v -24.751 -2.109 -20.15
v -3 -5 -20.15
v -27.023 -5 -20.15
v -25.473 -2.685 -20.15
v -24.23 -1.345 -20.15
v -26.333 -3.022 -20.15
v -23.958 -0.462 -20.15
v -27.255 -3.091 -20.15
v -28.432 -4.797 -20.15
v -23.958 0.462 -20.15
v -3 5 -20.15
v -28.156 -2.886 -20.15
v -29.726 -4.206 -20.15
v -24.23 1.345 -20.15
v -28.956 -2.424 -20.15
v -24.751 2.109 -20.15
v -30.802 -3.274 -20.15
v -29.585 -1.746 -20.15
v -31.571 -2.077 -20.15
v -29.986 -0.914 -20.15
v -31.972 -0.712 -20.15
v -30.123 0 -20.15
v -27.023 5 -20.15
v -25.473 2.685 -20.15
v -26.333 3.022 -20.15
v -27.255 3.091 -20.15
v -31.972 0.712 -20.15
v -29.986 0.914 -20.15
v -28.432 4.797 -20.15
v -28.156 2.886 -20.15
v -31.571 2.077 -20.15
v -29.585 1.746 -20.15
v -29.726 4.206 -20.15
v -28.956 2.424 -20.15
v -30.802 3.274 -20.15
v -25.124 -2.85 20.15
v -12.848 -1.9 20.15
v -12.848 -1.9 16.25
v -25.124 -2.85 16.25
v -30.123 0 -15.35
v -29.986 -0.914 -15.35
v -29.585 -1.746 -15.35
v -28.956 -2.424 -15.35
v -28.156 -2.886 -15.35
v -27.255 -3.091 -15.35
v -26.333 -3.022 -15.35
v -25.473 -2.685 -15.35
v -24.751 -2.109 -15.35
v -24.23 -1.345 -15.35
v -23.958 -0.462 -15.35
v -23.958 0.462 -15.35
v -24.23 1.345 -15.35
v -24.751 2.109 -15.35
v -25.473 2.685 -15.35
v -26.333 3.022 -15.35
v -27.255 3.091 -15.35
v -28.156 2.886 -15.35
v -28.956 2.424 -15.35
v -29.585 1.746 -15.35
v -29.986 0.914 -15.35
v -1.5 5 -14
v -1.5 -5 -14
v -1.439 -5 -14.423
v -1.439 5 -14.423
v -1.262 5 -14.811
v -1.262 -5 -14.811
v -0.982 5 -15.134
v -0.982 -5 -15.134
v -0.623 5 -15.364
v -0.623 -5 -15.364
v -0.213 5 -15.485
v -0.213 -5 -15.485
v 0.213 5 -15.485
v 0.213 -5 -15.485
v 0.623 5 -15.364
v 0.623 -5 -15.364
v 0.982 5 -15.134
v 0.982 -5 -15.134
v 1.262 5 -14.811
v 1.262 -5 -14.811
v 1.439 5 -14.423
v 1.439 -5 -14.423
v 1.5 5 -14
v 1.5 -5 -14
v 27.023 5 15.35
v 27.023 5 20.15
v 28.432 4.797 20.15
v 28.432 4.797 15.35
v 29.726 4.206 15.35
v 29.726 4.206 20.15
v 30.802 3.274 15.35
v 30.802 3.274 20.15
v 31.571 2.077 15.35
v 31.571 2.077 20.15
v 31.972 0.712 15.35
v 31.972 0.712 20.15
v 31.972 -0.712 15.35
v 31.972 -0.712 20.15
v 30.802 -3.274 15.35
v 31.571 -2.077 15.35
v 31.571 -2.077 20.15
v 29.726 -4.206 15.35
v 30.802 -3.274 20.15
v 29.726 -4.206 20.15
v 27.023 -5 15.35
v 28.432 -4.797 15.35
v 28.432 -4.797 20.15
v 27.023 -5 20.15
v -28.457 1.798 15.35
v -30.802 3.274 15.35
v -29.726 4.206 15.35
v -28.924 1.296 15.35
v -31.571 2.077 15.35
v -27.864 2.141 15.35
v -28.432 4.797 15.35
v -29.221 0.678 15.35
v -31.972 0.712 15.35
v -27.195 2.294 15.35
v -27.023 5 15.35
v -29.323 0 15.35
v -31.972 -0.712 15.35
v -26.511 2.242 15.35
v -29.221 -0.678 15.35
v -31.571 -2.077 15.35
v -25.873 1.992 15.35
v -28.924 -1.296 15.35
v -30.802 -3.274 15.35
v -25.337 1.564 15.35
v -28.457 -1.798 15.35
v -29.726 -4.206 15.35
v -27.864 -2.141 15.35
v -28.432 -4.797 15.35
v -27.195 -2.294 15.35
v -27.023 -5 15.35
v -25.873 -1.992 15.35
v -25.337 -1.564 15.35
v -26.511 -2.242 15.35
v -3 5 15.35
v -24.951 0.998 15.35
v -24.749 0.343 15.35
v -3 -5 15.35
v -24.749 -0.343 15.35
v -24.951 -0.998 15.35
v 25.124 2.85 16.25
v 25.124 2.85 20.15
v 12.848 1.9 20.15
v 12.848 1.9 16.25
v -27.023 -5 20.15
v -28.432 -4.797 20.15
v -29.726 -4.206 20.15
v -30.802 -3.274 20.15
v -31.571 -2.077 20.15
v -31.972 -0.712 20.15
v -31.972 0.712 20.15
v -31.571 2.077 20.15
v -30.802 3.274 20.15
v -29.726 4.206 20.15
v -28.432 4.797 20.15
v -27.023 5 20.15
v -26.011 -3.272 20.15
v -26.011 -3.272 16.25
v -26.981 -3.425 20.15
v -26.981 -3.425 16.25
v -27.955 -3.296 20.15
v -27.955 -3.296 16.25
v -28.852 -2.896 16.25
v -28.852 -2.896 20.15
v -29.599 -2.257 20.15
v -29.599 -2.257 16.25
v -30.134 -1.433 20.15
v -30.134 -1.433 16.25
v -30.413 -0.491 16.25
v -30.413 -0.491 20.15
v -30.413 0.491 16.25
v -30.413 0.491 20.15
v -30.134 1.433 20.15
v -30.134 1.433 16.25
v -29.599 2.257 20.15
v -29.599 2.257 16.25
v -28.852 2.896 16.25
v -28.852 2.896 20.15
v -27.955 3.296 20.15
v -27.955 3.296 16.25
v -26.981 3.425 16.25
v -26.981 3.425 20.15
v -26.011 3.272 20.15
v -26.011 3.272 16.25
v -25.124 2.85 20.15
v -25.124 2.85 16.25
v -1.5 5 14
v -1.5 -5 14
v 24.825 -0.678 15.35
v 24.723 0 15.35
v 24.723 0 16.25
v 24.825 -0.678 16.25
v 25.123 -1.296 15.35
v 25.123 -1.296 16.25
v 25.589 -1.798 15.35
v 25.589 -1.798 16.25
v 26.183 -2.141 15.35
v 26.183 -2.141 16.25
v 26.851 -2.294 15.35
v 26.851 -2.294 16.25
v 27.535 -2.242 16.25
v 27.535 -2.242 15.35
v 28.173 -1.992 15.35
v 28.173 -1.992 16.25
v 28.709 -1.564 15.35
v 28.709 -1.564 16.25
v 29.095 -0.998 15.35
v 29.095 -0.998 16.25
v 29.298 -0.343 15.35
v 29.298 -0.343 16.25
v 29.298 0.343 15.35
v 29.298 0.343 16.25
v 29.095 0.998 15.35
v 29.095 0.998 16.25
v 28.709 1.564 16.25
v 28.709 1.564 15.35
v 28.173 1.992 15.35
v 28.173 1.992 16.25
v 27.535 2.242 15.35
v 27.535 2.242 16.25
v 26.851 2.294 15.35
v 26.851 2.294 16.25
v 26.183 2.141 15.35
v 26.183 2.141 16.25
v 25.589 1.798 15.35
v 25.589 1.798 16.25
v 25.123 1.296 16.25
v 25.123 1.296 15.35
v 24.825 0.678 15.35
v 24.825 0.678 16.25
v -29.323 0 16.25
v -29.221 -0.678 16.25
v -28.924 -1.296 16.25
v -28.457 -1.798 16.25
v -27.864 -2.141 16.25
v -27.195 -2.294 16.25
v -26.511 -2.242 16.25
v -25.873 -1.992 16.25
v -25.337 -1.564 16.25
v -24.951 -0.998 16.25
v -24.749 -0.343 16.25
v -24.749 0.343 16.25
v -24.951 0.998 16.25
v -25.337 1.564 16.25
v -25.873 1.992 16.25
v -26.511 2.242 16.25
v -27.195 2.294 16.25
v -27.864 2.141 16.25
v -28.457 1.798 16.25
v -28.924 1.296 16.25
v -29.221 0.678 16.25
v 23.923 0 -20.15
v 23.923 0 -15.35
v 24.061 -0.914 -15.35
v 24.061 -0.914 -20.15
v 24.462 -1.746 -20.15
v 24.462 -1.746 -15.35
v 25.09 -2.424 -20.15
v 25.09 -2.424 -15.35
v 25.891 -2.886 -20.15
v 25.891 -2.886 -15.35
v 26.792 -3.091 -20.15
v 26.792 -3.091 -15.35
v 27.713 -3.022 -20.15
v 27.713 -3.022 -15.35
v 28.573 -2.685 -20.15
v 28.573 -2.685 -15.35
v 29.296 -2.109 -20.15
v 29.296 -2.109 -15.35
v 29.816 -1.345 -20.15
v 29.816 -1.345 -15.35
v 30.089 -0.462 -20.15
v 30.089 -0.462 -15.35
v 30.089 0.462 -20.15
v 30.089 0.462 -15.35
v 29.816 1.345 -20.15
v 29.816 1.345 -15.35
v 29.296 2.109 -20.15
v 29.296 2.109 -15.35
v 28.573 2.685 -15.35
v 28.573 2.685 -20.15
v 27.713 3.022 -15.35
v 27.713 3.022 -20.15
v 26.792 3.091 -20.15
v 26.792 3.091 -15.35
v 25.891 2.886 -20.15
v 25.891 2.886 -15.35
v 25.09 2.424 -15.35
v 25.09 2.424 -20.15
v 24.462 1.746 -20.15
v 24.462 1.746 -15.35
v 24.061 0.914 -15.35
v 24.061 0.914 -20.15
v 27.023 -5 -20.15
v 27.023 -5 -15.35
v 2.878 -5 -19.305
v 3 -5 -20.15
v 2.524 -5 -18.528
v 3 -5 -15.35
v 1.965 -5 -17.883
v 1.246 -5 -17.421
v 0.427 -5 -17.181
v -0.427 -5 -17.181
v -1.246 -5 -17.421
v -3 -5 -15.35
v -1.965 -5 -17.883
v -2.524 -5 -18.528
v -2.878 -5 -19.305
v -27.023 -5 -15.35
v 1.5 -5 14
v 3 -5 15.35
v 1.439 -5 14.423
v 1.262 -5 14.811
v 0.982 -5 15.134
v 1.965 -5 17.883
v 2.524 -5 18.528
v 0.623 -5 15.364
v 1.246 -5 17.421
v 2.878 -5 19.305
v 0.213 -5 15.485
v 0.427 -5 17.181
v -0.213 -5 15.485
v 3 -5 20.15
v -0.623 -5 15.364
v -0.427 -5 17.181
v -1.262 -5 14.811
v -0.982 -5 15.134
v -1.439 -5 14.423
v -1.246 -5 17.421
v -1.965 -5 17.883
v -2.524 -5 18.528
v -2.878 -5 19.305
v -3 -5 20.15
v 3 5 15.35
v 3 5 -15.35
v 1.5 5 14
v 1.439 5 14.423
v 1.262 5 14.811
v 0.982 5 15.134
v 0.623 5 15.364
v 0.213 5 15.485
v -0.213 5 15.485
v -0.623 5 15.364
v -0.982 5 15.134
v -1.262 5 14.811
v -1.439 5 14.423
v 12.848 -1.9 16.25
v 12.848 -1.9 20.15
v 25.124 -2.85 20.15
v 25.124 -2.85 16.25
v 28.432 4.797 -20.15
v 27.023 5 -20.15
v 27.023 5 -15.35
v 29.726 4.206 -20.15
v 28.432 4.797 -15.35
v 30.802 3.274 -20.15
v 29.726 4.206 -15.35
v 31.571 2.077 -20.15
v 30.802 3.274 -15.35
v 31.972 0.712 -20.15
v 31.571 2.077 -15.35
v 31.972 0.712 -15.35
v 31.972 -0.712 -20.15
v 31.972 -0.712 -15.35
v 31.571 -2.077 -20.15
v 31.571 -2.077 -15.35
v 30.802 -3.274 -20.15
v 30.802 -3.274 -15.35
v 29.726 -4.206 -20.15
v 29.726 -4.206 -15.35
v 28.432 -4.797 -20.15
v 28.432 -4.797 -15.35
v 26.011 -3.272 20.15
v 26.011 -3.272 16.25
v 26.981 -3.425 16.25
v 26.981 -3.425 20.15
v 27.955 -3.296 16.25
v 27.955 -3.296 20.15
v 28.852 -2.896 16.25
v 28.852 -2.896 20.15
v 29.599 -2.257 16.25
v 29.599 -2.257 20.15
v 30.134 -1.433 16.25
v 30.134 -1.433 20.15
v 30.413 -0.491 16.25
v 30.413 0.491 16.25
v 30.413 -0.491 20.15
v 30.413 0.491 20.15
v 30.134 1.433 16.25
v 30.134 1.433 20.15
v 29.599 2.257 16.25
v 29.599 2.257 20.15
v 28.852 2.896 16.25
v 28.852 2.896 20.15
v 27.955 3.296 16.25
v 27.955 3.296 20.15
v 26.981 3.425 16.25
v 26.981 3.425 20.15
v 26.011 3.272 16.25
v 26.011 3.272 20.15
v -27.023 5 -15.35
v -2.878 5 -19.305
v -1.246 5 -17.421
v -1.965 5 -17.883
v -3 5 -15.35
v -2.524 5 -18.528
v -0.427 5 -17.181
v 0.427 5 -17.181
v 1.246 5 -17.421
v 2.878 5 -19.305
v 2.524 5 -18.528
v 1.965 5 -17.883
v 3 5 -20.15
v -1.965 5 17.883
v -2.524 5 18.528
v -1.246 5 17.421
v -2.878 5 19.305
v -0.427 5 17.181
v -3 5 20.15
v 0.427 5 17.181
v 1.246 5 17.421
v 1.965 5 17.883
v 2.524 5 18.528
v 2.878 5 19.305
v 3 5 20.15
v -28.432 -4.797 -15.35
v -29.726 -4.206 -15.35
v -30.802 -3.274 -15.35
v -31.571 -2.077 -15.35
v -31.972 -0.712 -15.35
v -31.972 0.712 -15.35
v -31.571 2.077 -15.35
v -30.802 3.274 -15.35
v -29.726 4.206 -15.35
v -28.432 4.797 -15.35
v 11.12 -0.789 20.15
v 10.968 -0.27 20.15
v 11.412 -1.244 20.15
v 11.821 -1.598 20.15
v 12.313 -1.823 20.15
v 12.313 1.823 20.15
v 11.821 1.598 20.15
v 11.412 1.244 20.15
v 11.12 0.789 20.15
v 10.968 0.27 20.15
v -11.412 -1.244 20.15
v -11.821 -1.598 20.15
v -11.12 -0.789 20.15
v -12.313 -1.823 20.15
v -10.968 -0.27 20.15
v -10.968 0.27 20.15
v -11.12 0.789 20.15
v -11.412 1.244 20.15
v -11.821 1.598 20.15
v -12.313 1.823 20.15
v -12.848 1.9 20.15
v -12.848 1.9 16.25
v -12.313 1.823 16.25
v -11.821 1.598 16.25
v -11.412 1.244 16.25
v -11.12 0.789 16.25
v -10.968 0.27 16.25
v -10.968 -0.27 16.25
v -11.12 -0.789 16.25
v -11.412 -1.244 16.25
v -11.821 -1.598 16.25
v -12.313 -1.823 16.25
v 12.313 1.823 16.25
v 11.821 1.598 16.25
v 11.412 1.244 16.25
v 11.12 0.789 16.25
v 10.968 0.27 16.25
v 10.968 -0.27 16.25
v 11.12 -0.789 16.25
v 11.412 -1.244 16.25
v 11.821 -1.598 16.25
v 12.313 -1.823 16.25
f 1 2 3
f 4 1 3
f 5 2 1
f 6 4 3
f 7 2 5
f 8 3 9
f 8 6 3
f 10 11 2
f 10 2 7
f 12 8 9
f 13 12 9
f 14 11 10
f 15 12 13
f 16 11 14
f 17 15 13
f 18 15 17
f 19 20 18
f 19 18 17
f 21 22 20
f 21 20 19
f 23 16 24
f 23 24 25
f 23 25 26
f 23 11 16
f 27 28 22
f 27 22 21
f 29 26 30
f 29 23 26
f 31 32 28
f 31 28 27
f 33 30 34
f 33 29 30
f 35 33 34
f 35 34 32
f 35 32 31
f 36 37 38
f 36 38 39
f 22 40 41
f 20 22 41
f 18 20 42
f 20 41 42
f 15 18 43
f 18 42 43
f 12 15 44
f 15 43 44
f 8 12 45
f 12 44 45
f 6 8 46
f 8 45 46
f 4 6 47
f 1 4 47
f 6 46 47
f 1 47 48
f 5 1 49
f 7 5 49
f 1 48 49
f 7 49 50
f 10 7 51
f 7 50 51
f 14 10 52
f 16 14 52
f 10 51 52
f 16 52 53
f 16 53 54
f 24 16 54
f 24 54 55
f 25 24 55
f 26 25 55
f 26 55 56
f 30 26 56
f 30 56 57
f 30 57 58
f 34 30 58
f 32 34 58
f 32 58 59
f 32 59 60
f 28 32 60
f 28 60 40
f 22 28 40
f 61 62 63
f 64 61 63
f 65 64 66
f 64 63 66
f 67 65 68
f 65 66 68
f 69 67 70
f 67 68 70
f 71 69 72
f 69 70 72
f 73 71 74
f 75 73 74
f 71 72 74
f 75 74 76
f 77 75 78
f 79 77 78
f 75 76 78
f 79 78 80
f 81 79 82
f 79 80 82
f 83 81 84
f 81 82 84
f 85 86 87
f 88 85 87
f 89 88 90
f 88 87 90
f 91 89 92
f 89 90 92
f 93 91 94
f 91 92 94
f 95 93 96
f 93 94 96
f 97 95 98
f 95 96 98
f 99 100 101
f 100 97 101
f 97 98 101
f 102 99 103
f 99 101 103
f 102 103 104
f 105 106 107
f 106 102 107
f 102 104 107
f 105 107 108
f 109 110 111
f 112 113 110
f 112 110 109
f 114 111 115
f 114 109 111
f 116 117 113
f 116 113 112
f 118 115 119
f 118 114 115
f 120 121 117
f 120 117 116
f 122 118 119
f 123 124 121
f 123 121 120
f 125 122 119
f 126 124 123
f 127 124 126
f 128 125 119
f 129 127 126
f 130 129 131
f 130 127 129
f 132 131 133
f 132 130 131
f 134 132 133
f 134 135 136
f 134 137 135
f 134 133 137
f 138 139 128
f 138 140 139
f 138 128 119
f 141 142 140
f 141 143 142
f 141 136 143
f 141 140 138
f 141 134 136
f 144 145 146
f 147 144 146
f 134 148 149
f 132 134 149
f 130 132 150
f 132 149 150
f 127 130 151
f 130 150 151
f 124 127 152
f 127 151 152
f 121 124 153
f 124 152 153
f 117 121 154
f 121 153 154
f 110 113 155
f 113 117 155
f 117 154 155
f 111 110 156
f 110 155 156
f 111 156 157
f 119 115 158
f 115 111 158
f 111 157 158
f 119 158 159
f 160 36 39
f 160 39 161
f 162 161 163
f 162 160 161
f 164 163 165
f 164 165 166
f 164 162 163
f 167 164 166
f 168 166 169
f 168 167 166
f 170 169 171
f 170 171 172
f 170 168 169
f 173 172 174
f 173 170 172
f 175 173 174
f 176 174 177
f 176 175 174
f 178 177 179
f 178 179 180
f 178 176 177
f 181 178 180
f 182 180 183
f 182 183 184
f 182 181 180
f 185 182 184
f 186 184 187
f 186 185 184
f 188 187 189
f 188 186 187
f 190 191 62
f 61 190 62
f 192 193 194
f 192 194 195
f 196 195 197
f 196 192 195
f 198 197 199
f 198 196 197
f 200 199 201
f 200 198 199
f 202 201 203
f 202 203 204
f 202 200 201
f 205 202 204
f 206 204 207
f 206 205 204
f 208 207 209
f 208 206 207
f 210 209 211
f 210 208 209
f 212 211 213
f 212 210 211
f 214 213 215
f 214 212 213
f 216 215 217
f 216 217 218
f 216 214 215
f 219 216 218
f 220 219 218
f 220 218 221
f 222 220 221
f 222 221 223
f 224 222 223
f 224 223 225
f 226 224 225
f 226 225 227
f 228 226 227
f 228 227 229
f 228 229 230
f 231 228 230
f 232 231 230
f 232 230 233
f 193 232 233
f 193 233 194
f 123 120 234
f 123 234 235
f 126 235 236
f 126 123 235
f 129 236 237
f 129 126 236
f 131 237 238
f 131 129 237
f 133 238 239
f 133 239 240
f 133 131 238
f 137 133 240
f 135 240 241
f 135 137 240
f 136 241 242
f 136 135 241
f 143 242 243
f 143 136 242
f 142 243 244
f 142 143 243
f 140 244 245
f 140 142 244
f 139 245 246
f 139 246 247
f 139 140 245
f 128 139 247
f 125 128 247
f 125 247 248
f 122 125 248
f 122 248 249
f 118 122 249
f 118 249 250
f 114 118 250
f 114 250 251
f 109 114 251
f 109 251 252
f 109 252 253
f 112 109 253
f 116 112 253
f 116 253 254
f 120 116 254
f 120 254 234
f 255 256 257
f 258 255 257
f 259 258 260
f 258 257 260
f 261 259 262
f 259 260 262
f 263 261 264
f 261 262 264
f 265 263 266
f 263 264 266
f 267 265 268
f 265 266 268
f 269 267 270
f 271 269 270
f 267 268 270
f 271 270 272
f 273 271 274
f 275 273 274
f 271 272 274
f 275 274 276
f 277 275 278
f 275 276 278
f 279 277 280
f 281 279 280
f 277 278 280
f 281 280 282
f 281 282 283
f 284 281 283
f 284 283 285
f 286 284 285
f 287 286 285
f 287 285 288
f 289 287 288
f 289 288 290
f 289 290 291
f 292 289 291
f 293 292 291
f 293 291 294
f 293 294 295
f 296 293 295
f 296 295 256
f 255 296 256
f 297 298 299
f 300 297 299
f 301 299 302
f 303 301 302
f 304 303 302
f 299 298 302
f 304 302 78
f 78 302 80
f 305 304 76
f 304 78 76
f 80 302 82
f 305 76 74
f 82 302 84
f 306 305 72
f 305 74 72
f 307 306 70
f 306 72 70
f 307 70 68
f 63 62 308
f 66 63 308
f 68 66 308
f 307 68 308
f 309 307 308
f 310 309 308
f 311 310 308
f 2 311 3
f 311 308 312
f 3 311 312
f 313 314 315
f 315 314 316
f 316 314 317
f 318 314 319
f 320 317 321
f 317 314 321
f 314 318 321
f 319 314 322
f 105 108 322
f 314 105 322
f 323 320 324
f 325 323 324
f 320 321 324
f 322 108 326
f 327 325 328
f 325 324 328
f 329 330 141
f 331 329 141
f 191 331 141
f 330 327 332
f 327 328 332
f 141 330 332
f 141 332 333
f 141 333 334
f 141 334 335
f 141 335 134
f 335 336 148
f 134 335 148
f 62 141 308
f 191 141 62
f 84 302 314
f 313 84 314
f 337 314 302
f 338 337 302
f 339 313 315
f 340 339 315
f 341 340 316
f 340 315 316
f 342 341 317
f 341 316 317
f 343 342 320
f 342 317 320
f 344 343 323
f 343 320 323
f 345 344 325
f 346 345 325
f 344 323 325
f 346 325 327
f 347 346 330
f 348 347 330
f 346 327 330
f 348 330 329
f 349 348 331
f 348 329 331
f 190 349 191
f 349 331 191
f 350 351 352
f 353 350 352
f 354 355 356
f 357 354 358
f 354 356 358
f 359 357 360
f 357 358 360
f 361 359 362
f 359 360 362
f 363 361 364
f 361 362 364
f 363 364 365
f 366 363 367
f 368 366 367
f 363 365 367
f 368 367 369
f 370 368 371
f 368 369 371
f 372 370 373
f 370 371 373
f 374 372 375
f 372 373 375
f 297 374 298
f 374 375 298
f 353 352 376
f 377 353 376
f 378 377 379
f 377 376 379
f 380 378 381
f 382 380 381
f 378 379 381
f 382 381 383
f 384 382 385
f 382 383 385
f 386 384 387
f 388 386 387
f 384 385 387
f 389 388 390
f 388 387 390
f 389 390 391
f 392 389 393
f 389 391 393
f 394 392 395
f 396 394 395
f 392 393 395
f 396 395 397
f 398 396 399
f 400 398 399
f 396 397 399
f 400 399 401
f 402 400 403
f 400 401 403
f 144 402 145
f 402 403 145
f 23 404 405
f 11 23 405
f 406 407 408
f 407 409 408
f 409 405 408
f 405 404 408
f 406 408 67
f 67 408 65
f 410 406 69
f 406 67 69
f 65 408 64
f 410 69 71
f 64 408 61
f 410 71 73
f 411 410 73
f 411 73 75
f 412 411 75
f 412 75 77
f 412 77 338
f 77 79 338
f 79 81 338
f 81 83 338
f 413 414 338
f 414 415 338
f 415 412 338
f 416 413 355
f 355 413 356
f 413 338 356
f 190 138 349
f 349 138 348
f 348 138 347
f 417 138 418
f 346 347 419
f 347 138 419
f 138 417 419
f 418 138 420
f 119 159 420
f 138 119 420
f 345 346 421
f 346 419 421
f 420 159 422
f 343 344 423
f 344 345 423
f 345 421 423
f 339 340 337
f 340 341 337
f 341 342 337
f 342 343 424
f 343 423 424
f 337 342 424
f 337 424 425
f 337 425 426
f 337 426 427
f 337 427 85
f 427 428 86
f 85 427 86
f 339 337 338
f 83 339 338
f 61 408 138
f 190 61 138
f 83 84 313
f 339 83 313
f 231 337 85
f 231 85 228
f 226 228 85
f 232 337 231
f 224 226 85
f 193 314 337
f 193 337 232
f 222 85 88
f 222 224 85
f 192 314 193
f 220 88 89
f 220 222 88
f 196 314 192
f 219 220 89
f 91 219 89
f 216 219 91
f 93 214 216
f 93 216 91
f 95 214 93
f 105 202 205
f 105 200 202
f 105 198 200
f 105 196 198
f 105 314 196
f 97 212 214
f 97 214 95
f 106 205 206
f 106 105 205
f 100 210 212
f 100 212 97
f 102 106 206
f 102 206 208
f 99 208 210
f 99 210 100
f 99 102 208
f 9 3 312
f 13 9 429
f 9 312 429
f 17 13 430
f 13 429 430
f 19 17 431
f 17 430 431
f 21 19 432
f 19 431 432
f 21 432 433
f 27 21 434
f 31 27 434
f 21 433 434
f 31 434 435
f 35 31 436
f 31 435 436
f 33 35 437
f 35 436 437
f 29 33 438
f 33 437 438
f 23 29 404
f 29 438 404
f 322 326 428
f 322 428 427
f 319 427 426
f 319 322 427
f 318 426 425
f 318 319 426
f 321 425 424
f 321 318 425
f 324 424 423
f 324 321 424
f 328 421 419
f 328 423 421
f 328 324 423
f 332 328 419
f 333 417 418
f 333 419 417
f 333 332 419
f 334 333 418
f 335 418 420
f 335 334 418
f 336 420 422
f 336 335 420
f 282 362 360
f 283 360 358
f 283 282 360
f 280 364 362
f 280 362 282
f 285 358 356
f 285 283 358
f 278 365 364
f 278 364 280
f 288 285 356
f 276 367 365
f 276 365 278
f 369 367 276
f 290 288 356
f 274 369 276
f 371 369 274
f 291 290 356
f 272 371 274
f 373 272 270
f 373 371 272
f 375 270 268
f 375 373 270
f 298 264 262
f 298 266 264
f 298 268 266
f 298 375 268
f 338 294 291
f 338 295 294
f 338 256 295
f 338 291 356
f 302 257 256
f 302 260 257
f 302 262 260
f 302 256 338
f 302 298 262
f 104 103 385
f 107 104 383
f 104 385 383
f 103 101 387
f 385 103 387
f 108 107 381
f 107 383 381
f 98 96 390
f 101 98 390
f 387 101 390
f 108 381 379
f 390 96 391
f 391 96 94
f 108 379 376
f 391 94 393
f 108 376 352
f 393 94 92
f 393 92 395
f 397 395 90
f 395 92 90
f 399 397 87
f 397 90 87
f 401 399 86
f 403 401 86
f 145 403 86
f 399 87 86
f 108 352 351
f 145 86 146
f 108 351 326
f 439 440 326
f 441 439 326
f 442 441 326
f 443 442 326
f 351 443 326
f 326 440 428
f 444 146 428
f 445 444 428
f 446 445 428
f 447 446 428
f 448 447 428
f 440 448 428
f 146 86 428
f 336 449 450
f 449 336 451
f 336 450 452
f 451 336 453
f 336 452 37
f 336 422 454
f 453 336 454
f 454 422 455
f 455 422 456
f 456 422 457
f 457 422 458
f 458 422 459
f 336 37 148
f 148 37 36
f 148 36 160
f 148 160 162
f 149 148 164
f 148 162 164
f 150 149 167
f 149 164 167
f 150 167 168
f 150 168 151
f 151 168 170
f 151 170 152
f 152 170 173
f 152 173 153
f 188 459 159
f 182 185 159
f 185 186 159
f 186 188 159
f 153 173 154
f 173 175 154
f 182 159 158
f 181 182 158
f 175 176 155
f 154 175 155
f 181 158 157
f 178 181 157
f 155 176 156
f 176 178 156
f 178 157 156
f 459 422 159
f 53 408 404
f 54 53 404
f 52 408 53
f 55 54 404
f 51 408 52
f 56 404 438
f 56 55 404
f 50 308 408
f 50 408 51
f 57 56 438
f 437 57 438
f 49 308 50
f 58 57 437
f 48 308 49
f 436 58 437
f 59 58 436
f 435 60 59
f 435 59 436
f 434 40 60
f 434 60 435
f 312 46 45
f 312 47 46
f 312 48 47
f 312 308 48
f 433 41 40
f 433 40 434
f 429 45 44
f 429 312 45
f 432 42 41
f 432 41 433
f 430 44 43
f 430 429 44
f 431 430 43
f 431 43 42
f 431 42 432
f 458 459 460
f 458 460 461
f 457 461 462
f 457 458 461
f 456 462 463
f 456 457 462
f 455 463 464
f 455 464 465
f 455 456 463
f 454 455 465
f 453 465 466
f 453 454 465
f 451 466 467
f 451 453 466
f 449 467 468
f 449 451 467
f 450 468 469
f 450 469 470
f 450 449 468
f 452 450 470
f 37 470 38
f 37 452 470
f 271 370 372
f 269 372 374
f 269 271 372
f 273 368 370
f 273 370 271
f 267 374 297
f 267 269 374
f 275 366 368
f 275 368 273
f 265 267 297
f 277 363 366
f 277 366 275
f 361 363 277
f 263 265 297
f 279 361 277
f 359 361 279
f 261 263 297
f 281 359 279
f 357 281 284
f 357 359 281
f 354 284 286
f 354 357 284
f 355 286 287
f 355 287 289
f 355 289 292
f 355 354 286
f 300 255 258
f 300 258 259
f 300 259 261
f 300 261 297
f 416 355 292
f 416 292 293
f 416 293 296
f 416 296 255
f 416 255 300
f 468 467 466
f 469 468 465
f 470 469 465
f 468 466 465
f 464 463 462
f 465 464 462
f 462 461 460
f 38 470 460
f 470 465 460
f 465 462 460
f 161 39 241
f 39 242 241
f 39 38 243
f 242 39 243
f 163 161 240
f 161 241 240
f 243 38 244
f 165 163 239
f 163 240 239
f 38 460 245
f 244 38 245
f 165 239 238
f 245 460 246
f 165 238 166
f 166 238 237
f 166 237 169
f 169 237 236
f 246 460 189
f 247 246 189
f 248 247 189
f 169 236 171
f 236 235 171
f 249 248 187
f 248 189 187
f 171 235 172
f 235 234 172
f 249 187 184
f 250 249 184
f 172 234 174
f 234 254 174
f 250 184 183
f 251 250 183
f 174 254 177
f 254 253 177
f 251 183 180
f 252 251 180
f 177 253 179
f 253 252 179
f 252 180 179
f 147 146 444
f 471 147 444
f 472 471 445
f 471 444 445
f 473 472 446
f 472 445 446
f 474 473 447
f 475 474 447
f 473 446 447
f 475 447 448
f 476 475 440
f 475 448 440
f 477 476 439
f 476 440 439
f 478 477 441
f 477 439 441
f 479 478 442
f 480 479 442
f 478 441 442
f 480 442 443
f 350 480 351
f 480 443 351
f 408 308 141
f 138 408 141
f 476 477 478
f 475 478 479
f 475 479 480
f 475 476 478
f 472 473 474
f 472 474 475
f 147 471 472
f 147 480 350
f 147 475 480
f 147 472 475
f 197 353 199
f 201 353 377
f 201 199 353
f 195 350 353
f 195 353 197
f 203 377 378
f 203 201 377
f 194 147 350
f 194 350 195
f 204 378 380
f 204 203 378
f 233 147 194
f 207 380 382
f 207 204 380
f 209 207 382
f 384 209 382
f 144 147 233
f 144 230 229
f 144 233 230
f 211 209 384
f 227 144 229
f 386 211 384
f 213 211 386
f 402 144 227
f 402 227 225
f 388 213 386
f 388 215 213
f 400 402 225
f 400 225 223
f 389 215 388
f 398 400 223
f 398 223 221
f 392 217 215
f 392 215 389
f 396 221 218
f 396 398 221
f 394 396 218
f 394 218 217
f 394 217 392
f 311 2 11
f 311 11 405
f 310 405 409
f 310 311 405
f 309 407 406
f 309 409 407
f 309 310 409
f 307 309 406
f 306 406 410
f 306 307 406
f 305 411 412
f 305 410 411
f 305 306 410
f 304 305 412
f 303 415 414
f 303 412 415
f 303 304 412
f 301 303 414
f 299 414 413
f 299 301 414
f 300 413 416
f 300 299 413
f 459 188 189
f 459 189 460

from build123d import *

# Parameters (mm, degrees)
BOSS_EXTRUDE1_DEPTH     = 20.15
CUT_EXTRUDE1_DEPTH      = 40.134529676
CUT_EXTRUDE1_DEPTH_BACK = 40.134529676
SKETCH2_R               = 3
CUT_EXTRUDE2_DEPTH      = 3.9
SKETCH5_R               = 2.3
CUT_EXTRUDE4_DEPTH      = 16.25
CUT_EXTRUDE5_START      = -15.35
SKETCH7_R               = 3.1
CUT_EXTRUDE5_DEPTH      = 23.814268799


with BuildPart() as part:
    # Sketch1 → Boss-Extrude1 (new, symmetric)
    with BuildSketch(Plane.XY):
        with BuildLine():
            Line((-27.023255814, 5), (27.023255814, 5))
            ThreePointArc((27.023255814, 5), (32.023255814, 0), (27.023255814, -5))
            Line((27.023255814, -5), (-27.023255814, -5))
            ThreePointArc((-27.023255814, -5), (-32.023255814, 0), (-27.023255814, 5))
        make_face()
    extrude(amount=BOSS_EXTRUDE1_DEPTH, both=True)

    # Sketch2 → Cut-Extrude1 (cut, two sides: drawn at the far end of the back side and taken through both)
    with BuildSketch(Plane(origin=(0, 5, 0), x_dir=(1, 0, 0), z_dir=(0, 1, 0)).offset(-CUT_EXTRUDE1_DEPTH_BACK)):
        with Locations((0, 20.15)):
            Circle(SKETCH2_R)
        with Locations((0, -20.15)):
            Circle(SKETCH2_R)
        with BuildLine():
            Line((-1.5, -14), (-1.5, 14))
            ThreePointArc((-1.5, 14), (0, 15.5), (1.5, 14))
            Line((1.5, 14), (1.5, -14))
            ThreePointArc((1.5, -14), (0, -15.5), (-1.5, -14))
        make_face()
        Polygon((27.023255814, 15.35), (38.05829872, 15.35), (38.05829872, -15.35), (27.023255814, -15.35), (3, -15.35), (3, 15.35), align=None)
        Polygon((-27.023255814, -15.35), (-38.05829872, -15.35), (-38.05829872, 15.35), (-27.023255814, 15.35), (-3, 15.35), (-3, -15.35), align=None)
    extrude(amount=CUT_EXTRUDE1_DEPTH + CUT_EXTRUDE1_DEPTH_BACK, mode=Mode.SUBTRACT)

    # Sketch4 → Cut-Extrude2 (cut)
    with BuildSketch(Plane.XY.offset(20.15)):
        with BuildLine():
            Line((25.123749299, 2.85), (12.848255814, 1.9))
            ThreePointArc((12.848255814, 1.9), (10.948255814, 0), (12.848255814, -1.9))
            Line((12.848255814, -1.9), (25.123749299, -2.85))
            ThreePointArc((25.123749299, -2.85), (30.448255814, 0), (25.123749299, 2.85))
        make_face()
        with BuildLine():
            Line((-25.123749299, 2.85), (-12.848255814, 1.9))
            ThreePointArc((-12.848255814, 1.9), (-10.948255814, 0), (-12.848255814, -1.9))
            Line((-12.848255814, -1.9), (-25.123749299, -2.85))
            ThreePointArc((-25.123749299, -2.85), (-30.448255814, 0), (-25.123749299, 2.85))
        make_face()
    extrude(amount=-CUT_EXTRUDE2_DEPTH, mode=Mode.SUBTRACT)

    # Sketch5 → Cut-Extrude4 (cut)
    with BuildSketch(Plane.XY):
        with Locations(Location((27.023255814, 0, 0), (0, 0, 180))):
            Circle(SKETCH5_R)
        with Locations(Location((-27.023255814, 0, 0), (0, 0, 180))):
            Circle(SKETCH5_R)
    extrude(amount=CUT_EXTRUDE4_DEPTH, mode=Mode.SUBTRACT)

    # Sketch7 → Cut-Extrude5 (cut, through all)
    with BuildSketch(Plane.XY.offset(CUT_EXTRUDE5_START)):
        with Locations(Location((27.023255814, 0, 0), (0, 0, 180))):
            Circle(SKETCH7_R)
        with Locations(Location((-27.023255814, 0, 0), (0, 0, 180))):
            Circle(SKETCH7_R)
    extrude(amount=-CUT_EXTRUDE5_DEPTH, mode=Mode.SUBTRACT)


solid = part.part
